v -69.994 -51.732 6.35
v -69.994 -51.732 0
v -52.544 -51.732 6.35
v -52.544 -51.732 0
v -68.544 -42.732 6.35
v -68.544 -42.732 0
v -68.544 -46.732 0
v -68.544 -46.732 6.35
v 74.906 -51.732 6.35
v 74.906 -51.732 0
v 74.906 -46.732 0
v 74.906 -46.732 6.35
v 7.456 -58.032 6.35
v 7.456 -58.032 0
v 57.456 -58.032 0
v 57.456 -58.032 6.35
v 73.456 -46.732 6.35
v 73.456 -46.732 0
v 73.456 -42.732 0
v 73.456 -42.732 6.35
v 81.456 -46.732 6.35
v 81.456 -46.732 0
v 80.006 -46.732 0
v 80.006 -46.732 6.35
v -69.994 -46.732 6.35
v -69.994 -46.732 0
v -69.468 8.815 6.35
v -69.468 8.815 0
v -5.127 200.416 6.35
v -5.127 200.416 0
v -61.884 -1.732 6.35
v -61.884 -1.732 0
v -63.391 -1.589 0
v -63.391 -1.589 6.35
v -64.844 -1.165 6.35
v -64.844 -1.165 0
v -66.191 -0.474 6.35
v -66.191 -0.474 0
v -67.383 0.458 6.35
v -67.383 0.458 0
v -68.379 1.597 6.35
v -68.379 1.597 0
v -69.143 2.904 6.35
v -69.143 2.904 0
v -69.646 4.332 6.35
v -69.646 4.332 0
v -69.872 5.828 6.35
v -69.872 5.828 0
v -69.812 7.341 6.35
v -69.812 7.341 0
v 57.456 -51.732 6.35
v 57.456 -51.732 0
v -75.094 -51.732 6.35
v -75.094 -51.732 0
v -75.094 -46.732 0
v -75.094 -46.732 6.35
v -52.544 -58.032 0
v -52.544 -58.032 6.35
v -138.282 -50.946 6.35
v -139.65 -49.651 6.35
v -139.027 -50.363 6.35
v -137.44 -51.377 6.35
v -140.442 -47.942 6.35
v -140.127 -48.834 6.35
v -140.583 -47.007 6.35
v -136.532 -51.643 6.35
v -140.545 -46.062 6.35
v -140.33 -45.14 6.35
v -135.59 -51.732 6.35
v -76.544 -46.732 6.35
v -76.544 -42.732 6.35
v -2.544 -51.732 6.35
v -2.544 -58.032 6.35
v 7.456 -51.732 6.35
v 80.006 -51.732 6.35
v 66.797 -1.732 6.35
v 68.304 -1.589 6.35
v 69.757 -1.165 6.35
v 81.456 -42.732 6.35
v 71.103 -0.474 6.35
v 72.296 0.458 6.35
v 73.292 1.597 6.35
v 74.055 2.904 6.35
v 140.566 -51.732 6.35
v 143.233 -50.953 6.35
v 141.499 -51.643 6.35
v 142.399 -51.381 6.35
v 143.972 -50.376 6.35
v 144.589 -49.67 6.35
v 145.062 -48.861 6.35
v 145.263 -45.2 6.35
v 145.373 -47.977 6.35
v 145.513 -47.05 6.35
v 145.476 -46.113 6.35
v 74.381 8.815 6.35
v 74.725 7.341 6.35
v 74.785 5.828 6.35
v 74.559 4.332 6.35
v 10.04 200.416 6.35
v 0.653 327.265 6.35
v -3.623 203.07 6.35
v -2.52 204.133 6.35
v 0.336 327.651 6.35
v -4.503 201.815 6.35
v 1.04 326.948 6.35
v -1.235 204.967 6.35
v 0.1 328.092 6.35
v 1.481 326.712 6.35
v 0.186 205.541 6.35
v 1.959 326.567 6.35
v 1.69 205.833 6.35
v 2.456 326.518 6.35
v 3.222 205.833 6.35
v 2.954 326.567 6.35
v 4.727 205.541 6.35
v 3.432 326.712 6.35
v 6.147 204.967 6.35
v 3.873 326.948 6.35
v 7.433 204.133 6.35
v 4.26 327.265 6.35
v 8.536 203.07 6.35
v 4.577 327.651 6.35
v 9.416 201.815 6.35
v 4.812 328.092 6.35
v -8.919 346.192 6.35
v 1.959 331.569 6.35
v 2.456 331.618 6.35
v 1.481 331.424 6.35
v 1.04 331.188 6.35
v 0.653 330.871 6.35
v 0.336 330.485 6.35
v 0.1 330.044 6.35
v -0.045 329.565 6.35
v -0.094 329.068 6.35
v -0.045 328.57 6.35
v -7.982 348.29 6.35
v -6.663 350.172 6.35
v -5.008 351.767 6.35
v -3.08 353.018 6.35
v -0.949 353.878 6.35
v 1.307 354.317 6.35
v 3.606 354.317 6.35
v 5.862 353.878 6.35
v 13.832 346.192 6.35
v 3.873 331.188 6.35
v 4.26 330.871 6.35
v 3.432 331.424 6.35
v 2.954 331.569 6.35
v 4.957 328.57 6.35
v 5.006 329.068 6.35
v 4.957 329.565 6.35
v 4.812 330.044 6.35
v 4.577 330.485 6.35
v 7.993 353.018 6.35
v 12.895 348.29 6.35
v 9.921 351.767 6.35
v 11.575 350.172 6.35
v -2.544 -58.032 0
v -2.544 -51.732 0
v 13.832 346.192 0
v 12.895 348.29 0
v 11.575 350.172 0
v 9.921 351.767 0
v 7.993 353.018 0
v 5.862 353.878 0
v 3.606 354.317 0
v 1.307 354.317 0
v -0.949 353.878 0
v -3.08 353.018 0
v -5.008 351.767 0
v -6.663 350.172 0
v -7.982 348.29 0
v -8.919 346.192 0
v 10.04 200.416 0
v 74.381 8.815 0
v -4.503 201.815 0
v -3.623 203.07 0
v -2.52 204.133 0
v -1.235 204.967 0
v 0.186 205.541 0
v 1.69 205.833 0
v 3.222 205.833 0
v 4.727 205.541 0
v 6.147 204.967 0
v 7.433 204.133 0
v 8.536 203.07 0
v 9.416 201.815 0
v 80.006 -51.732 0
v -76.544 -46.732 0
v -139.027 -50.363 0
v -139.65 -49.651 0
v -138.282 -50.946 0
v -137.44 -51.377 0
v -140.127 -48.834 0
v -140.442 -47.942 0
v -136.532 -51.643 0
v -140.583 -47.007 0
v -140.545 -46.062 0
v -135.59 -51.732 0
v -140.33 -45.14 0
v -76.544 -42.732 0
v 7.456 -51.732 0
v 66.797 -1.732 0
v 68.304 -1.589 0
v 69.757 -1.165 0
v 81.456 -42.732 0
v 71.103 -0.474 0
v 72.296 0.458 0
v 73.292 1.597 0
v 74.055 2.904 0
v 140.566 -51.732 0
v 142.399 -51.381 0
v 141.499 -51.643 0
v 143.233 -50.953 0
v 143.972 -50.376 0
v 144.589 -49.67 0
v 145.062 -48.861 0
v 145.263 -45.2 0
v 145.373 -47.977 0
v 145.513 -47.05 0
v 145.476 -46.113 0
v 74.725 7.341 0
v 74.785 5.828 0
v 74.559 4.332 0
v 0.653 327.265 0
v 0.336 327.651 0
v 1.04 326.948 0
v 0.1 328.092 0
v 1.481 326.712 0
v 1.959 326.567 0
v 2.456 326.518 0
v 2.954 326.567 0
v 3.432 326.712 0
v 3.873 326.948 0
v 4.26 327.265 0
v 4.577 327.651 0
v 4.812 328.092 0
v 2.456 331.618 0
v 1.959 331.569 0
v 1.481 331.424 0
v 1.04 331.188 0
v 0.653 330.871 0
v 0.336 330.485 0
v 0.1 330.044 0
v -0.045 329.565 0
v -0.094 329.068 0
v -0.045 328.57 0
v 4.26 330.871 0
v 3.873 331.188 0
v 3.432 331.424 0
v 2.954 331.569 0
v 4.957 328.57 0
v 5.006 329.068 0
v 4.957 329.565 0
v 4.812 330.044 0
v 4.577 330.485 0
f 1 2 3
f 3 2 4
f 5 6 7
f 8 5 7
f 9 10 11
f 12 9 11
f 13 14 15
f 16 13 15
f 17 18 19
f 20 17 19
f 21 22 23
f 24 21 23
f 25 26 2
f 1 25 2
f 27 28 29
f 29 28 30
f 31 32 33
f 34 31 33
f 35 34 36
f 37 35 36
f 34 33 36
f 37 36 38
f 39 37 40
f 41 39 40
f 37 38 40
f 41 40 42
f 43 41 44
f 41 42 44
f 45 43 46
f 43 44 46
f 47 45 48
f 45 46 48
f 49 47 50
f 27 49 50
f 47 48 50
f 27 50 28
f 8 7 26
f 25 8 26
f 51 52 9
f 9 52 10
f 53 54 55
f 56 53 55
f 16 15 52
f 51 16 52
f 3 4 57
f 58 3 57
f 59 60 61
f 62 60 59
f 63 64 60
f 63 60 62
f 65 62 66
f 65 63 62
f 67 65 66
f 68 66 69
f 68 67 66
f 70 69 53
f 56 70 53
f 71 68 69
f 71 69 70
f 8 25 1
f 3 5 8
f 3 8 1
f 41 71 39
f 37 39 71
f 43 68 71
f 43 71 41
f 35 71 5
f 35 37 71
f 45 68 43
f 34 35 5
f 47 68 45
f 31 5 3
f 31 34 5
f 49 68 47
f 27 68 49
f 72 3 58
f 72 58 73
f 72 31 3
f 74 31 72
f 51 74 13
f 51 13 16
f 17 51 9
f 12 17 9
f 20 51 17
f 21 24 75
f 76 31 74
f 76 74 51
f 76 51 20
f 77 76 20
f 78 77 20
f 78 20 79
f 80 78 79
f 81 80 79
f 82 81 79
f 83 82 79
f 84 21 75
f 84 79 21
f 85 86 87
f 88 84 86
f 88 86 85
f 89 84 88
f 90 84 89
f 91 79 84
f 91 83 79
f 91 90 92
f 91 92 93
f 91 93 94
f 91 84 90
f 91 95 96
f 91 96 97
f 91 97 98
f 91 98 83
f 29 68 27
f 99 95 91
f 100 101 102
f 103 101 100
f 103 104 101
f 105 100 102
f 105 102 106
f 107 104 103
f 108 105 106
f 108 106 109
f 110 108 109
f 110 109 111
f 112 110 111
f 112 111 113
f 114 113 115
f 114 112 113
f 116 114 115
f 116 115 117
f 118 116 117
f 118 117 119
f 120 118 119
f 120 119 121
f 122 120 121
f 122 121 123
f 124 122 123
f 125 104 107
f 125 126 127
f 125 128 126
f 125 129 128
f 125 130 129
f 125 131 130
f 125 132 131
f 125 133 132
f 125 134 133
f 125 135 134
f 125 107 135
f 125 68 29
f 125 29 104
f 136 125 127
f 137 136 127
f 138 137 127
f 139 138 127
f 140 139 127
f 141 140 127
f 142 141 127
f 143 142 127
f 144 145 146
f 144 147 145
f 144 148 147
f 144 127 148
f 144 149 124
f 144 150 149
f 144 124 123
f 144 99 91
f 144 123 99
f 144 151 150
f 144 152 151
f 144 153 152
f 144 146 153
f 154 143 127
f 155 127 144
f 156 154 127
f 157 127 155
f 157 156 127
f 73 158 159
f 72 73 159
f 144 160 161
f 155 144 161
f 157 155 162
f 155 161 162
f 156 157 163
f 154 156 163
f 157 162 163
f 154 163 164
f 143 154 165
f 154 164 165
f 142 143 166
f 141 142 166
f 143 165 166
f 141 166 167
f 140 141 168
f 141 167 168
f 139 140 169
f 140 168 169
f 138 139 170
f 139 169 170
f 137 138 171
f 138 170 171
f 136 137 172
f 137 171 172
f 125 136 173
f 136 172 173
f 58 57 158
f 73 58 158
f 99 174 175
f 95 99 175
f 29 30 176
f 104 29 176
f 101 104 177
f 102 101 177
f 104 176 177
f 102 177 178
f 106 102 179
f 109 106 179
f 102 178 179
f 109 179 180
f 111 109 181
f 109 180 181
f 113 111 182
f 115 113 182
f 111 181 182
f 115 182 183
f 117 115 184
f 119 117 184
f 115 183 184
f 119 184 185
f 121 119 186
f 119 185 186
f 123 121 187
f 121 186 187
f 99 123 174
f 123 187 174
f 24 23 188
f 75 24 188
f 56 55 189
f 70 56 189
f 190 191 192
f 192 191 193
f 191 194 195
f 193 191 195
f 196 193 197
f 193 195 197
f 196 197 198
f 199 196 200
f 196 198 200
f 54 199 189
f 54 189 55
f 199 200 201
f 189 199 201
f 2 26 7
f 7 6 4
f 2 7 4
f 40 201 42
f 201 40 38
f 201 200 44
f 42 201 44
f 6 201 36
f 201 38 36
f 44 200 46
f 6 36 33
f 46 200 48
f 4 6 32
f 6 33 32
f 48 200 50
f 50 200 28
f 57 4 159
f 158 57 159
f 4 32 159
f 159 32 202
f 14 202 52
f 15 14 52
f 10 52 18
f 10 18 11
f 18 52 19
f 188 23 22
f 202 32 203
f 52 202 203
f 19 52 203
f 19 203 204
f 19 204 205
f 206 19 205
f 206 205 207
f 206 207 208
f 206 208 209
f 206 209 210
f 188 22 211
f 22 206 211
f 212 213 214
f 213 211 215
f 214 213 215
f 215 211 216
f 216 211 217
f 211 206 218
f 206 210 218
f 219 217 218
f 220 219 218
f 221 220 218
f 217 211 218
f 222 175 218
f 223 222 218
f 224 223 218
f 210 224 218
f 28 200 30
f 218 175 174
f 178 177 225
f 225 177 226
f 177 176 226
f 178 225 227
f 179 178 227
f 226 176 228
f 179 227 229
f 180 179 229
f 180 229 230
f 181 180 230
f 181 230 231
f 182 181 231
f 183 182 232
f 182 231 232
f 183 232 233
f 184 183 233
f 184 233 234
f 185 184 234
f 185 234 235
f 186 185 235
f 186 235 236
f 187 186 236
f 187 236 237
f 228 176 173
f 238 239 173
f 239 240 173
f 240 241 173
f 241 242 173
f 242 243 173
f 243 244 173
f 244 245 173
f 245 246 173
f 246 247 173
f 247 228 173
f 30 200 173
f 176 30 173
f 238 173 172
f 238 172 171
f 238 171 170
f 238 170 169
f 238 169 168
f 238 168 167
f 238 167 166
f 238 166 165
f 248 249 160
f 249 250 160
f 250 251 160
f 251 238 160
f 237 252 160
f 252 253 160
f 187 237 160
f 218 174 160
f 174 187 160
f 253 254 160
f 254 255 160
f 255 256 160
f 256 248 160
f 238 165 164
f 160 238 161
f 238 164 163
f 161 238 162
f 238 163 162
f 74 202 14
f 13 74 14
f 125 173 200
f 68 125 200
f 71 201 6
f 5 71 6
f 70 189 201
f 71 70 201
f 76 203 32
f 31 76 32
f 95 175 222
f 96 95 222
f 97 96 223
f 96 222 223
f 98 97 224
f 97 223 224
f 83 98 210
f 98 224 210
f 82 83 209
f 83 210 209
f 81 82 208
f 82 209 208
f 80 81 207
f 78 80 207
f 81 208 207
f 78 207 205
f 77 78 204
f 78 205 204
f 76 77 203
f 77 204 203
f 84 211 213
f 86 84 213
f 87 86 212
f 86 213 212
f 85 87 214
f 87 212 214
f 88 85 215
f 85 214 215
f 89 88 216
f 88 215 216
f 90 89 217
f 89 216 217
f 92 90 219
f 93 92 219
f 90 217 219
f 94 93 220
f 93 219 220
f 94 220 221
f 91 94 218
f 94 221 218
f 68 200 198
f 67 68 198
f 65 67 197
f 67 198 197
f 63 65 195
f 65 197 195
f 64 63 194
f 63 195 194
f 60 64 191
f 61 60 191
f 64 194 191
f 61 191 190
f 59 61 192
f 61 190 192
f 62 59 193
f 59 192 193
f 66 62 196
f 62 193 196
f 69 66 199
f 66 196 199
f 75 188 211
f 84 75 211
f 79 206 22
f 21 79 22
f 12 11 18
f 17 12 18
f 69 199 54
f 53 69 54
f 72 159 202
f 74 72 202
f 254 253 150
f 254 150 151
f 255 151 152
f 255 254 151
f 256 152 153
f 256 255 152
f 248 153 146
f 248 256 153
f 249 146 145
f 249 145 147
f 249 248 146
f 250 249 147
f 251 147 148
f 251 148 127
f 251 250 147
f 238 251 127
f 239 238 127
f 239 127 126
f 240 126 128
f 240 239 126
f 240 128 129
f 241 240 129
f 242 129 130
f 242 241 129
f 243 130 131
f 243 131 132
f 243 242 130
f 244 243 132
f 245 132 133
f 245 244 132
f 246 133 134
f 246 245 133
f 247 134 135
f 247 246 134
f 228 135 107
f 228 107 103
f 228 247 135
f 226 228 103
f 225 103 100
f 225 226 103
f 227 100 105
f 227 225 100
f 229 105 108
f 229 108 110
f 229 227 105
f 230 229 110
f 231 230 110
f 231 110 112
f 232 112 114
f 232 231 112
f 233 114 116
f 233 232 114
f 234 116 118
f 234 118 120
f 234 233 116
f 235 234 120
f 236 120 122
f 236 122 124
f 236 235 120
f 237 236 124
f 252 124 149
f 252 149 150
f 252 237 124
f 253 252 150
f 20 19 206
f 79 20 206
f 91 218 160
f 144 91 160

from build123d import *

# Parameters (mm, degrees)
F0_R     = 2.55
F1_DEPTH = 6.35


with BuildPart() as f1:
    # F0 (on Top) → F1 (new body)
    with BuildSketch(Plane.XY):
        with BuildLine():
            Line((-8.919358, 346.191724), (-140.330109, -45.140431))
            ThreePointArc((-140.330109, -45.140431), (-139.649673, -49.651147), (-135.590217, -51.732103))
            Line((-135.590217, -51.732103), (-75.093617, -51.732103))
            Line((-75.093617, -51.732103), (-75.093617, -46.732103))
            Line((-75.093617, -46.732103), (-76.543617, -46.732103))
            Line((-76.543617, -46.732103), (-76.543617, -42.732103))
            Line((-76.543617, -42.732103), (-75.093617, -42.732103))
            Line((-75.093617, -42.732103), (-72.543617, -42.732103))
            Line((-72.543617, -42.732103), (-69.993617, -42.732103))
            Line((-69.993617, -42.732103), (-68.543617, -42.732103))
            Line((-68.543617, -42.732103), (-68.543617, -46.732103))
            Line((-68.543617, -46.732103), (-69.993617, -46.732103))
            Line((-69.993617, -46.732103), (-69.993617, -51.732103))
            Line((-69.993617, -51.732103), (-52.543617, -51.732103))
            Line((-52.543617, -51.732103), (-52.543617, -58.032103))
            Line((-52.543617, -58.032103), (-2.543617, -58.032103))
            Line((-2.543617, -58.032103), (-2.543617, -51.732103))
            Line((-2.543617, -51.732103), (2.456383, -51.732103))
            Line((2.456383, -51.732103), (7.456383, -51.732103))
            Line((7.456383, -51.732103), (7.456383, -58.032103))
            Line((7.456383, -58.032103), (57.456383, -58.032103))
            Line((57.456383, -58.032103), (57.456383, -51.732103))
            Line((57.456383, -51.732103), (74.906383, -51.732103))
            Line((74.906383, -51.732103), (74.906383, -46.732103))
            Line((74.906383, -46.732103), (73.456383, -46.732103))
            Line((73.456383, -46.732103), (73.456383, -42.732103))
            Line((73.456383, -42.732103), (74.906383, -42.732103))
            Line((74.906383, -42.732103), (77.456383, -42.732103))
            Line((77.456383, -42.732103), (80.006383, -42.732103))
            Line((80.006383, -42.732103), (81.456383, -42.732103))
            Line((81.456383, -42.732103), (81.456383, -46.732103))
            Line((81.456383, -46.732103), (80.006383, -46.732103))
            Line((80.006383, -46.732103), (80.006383, -51.732103))
            Line((80.006383, -51.732103), (140.566313, -51.732103))
            ThreePointArc((140.566313, -51.732103), (144.588797, -49.6701), (145.263036, -45.200466))
            Line((145.263036, -45.200466), (13.832124, 346.191724))
            ThreePointArc((13.832124, 346.191724), (2.456383, 354.371709), (-8.919358, 346.191724))
        make_face()
        with BuildLine():
            Line((66.796947, -1.732103), (2.456383, -1.732103))
            Line((2.456383, -1.732103), (-61.88418, -1.732103))
            ThreePointArc((-61.88418, -1.732103), (-68.37931, 1.597426), (-69.468008, 8.814573))
            Line((-69.468008, 8.814573), (-5.127444, 200.416334))
            ThreePointArc((-5.127444, 200.416334), (2.456383, 205.869657), (10.040211, 200.416334))
            Line((10.040211, 200.416334), (74.380774, 8.814573))
            ThreePointArc((74.380774, 8.814573), (73.292076, 1.597426), (66.796947, -1.732103))
        make_face(mode=Mode.SUBTRACT)
        with Locations((2.456383, 329.067897)):
            Circle(F0_R, mode=Mode.SUBTRACT)
    extrude(amount=F1_DEPTH)


solid = f1.part
